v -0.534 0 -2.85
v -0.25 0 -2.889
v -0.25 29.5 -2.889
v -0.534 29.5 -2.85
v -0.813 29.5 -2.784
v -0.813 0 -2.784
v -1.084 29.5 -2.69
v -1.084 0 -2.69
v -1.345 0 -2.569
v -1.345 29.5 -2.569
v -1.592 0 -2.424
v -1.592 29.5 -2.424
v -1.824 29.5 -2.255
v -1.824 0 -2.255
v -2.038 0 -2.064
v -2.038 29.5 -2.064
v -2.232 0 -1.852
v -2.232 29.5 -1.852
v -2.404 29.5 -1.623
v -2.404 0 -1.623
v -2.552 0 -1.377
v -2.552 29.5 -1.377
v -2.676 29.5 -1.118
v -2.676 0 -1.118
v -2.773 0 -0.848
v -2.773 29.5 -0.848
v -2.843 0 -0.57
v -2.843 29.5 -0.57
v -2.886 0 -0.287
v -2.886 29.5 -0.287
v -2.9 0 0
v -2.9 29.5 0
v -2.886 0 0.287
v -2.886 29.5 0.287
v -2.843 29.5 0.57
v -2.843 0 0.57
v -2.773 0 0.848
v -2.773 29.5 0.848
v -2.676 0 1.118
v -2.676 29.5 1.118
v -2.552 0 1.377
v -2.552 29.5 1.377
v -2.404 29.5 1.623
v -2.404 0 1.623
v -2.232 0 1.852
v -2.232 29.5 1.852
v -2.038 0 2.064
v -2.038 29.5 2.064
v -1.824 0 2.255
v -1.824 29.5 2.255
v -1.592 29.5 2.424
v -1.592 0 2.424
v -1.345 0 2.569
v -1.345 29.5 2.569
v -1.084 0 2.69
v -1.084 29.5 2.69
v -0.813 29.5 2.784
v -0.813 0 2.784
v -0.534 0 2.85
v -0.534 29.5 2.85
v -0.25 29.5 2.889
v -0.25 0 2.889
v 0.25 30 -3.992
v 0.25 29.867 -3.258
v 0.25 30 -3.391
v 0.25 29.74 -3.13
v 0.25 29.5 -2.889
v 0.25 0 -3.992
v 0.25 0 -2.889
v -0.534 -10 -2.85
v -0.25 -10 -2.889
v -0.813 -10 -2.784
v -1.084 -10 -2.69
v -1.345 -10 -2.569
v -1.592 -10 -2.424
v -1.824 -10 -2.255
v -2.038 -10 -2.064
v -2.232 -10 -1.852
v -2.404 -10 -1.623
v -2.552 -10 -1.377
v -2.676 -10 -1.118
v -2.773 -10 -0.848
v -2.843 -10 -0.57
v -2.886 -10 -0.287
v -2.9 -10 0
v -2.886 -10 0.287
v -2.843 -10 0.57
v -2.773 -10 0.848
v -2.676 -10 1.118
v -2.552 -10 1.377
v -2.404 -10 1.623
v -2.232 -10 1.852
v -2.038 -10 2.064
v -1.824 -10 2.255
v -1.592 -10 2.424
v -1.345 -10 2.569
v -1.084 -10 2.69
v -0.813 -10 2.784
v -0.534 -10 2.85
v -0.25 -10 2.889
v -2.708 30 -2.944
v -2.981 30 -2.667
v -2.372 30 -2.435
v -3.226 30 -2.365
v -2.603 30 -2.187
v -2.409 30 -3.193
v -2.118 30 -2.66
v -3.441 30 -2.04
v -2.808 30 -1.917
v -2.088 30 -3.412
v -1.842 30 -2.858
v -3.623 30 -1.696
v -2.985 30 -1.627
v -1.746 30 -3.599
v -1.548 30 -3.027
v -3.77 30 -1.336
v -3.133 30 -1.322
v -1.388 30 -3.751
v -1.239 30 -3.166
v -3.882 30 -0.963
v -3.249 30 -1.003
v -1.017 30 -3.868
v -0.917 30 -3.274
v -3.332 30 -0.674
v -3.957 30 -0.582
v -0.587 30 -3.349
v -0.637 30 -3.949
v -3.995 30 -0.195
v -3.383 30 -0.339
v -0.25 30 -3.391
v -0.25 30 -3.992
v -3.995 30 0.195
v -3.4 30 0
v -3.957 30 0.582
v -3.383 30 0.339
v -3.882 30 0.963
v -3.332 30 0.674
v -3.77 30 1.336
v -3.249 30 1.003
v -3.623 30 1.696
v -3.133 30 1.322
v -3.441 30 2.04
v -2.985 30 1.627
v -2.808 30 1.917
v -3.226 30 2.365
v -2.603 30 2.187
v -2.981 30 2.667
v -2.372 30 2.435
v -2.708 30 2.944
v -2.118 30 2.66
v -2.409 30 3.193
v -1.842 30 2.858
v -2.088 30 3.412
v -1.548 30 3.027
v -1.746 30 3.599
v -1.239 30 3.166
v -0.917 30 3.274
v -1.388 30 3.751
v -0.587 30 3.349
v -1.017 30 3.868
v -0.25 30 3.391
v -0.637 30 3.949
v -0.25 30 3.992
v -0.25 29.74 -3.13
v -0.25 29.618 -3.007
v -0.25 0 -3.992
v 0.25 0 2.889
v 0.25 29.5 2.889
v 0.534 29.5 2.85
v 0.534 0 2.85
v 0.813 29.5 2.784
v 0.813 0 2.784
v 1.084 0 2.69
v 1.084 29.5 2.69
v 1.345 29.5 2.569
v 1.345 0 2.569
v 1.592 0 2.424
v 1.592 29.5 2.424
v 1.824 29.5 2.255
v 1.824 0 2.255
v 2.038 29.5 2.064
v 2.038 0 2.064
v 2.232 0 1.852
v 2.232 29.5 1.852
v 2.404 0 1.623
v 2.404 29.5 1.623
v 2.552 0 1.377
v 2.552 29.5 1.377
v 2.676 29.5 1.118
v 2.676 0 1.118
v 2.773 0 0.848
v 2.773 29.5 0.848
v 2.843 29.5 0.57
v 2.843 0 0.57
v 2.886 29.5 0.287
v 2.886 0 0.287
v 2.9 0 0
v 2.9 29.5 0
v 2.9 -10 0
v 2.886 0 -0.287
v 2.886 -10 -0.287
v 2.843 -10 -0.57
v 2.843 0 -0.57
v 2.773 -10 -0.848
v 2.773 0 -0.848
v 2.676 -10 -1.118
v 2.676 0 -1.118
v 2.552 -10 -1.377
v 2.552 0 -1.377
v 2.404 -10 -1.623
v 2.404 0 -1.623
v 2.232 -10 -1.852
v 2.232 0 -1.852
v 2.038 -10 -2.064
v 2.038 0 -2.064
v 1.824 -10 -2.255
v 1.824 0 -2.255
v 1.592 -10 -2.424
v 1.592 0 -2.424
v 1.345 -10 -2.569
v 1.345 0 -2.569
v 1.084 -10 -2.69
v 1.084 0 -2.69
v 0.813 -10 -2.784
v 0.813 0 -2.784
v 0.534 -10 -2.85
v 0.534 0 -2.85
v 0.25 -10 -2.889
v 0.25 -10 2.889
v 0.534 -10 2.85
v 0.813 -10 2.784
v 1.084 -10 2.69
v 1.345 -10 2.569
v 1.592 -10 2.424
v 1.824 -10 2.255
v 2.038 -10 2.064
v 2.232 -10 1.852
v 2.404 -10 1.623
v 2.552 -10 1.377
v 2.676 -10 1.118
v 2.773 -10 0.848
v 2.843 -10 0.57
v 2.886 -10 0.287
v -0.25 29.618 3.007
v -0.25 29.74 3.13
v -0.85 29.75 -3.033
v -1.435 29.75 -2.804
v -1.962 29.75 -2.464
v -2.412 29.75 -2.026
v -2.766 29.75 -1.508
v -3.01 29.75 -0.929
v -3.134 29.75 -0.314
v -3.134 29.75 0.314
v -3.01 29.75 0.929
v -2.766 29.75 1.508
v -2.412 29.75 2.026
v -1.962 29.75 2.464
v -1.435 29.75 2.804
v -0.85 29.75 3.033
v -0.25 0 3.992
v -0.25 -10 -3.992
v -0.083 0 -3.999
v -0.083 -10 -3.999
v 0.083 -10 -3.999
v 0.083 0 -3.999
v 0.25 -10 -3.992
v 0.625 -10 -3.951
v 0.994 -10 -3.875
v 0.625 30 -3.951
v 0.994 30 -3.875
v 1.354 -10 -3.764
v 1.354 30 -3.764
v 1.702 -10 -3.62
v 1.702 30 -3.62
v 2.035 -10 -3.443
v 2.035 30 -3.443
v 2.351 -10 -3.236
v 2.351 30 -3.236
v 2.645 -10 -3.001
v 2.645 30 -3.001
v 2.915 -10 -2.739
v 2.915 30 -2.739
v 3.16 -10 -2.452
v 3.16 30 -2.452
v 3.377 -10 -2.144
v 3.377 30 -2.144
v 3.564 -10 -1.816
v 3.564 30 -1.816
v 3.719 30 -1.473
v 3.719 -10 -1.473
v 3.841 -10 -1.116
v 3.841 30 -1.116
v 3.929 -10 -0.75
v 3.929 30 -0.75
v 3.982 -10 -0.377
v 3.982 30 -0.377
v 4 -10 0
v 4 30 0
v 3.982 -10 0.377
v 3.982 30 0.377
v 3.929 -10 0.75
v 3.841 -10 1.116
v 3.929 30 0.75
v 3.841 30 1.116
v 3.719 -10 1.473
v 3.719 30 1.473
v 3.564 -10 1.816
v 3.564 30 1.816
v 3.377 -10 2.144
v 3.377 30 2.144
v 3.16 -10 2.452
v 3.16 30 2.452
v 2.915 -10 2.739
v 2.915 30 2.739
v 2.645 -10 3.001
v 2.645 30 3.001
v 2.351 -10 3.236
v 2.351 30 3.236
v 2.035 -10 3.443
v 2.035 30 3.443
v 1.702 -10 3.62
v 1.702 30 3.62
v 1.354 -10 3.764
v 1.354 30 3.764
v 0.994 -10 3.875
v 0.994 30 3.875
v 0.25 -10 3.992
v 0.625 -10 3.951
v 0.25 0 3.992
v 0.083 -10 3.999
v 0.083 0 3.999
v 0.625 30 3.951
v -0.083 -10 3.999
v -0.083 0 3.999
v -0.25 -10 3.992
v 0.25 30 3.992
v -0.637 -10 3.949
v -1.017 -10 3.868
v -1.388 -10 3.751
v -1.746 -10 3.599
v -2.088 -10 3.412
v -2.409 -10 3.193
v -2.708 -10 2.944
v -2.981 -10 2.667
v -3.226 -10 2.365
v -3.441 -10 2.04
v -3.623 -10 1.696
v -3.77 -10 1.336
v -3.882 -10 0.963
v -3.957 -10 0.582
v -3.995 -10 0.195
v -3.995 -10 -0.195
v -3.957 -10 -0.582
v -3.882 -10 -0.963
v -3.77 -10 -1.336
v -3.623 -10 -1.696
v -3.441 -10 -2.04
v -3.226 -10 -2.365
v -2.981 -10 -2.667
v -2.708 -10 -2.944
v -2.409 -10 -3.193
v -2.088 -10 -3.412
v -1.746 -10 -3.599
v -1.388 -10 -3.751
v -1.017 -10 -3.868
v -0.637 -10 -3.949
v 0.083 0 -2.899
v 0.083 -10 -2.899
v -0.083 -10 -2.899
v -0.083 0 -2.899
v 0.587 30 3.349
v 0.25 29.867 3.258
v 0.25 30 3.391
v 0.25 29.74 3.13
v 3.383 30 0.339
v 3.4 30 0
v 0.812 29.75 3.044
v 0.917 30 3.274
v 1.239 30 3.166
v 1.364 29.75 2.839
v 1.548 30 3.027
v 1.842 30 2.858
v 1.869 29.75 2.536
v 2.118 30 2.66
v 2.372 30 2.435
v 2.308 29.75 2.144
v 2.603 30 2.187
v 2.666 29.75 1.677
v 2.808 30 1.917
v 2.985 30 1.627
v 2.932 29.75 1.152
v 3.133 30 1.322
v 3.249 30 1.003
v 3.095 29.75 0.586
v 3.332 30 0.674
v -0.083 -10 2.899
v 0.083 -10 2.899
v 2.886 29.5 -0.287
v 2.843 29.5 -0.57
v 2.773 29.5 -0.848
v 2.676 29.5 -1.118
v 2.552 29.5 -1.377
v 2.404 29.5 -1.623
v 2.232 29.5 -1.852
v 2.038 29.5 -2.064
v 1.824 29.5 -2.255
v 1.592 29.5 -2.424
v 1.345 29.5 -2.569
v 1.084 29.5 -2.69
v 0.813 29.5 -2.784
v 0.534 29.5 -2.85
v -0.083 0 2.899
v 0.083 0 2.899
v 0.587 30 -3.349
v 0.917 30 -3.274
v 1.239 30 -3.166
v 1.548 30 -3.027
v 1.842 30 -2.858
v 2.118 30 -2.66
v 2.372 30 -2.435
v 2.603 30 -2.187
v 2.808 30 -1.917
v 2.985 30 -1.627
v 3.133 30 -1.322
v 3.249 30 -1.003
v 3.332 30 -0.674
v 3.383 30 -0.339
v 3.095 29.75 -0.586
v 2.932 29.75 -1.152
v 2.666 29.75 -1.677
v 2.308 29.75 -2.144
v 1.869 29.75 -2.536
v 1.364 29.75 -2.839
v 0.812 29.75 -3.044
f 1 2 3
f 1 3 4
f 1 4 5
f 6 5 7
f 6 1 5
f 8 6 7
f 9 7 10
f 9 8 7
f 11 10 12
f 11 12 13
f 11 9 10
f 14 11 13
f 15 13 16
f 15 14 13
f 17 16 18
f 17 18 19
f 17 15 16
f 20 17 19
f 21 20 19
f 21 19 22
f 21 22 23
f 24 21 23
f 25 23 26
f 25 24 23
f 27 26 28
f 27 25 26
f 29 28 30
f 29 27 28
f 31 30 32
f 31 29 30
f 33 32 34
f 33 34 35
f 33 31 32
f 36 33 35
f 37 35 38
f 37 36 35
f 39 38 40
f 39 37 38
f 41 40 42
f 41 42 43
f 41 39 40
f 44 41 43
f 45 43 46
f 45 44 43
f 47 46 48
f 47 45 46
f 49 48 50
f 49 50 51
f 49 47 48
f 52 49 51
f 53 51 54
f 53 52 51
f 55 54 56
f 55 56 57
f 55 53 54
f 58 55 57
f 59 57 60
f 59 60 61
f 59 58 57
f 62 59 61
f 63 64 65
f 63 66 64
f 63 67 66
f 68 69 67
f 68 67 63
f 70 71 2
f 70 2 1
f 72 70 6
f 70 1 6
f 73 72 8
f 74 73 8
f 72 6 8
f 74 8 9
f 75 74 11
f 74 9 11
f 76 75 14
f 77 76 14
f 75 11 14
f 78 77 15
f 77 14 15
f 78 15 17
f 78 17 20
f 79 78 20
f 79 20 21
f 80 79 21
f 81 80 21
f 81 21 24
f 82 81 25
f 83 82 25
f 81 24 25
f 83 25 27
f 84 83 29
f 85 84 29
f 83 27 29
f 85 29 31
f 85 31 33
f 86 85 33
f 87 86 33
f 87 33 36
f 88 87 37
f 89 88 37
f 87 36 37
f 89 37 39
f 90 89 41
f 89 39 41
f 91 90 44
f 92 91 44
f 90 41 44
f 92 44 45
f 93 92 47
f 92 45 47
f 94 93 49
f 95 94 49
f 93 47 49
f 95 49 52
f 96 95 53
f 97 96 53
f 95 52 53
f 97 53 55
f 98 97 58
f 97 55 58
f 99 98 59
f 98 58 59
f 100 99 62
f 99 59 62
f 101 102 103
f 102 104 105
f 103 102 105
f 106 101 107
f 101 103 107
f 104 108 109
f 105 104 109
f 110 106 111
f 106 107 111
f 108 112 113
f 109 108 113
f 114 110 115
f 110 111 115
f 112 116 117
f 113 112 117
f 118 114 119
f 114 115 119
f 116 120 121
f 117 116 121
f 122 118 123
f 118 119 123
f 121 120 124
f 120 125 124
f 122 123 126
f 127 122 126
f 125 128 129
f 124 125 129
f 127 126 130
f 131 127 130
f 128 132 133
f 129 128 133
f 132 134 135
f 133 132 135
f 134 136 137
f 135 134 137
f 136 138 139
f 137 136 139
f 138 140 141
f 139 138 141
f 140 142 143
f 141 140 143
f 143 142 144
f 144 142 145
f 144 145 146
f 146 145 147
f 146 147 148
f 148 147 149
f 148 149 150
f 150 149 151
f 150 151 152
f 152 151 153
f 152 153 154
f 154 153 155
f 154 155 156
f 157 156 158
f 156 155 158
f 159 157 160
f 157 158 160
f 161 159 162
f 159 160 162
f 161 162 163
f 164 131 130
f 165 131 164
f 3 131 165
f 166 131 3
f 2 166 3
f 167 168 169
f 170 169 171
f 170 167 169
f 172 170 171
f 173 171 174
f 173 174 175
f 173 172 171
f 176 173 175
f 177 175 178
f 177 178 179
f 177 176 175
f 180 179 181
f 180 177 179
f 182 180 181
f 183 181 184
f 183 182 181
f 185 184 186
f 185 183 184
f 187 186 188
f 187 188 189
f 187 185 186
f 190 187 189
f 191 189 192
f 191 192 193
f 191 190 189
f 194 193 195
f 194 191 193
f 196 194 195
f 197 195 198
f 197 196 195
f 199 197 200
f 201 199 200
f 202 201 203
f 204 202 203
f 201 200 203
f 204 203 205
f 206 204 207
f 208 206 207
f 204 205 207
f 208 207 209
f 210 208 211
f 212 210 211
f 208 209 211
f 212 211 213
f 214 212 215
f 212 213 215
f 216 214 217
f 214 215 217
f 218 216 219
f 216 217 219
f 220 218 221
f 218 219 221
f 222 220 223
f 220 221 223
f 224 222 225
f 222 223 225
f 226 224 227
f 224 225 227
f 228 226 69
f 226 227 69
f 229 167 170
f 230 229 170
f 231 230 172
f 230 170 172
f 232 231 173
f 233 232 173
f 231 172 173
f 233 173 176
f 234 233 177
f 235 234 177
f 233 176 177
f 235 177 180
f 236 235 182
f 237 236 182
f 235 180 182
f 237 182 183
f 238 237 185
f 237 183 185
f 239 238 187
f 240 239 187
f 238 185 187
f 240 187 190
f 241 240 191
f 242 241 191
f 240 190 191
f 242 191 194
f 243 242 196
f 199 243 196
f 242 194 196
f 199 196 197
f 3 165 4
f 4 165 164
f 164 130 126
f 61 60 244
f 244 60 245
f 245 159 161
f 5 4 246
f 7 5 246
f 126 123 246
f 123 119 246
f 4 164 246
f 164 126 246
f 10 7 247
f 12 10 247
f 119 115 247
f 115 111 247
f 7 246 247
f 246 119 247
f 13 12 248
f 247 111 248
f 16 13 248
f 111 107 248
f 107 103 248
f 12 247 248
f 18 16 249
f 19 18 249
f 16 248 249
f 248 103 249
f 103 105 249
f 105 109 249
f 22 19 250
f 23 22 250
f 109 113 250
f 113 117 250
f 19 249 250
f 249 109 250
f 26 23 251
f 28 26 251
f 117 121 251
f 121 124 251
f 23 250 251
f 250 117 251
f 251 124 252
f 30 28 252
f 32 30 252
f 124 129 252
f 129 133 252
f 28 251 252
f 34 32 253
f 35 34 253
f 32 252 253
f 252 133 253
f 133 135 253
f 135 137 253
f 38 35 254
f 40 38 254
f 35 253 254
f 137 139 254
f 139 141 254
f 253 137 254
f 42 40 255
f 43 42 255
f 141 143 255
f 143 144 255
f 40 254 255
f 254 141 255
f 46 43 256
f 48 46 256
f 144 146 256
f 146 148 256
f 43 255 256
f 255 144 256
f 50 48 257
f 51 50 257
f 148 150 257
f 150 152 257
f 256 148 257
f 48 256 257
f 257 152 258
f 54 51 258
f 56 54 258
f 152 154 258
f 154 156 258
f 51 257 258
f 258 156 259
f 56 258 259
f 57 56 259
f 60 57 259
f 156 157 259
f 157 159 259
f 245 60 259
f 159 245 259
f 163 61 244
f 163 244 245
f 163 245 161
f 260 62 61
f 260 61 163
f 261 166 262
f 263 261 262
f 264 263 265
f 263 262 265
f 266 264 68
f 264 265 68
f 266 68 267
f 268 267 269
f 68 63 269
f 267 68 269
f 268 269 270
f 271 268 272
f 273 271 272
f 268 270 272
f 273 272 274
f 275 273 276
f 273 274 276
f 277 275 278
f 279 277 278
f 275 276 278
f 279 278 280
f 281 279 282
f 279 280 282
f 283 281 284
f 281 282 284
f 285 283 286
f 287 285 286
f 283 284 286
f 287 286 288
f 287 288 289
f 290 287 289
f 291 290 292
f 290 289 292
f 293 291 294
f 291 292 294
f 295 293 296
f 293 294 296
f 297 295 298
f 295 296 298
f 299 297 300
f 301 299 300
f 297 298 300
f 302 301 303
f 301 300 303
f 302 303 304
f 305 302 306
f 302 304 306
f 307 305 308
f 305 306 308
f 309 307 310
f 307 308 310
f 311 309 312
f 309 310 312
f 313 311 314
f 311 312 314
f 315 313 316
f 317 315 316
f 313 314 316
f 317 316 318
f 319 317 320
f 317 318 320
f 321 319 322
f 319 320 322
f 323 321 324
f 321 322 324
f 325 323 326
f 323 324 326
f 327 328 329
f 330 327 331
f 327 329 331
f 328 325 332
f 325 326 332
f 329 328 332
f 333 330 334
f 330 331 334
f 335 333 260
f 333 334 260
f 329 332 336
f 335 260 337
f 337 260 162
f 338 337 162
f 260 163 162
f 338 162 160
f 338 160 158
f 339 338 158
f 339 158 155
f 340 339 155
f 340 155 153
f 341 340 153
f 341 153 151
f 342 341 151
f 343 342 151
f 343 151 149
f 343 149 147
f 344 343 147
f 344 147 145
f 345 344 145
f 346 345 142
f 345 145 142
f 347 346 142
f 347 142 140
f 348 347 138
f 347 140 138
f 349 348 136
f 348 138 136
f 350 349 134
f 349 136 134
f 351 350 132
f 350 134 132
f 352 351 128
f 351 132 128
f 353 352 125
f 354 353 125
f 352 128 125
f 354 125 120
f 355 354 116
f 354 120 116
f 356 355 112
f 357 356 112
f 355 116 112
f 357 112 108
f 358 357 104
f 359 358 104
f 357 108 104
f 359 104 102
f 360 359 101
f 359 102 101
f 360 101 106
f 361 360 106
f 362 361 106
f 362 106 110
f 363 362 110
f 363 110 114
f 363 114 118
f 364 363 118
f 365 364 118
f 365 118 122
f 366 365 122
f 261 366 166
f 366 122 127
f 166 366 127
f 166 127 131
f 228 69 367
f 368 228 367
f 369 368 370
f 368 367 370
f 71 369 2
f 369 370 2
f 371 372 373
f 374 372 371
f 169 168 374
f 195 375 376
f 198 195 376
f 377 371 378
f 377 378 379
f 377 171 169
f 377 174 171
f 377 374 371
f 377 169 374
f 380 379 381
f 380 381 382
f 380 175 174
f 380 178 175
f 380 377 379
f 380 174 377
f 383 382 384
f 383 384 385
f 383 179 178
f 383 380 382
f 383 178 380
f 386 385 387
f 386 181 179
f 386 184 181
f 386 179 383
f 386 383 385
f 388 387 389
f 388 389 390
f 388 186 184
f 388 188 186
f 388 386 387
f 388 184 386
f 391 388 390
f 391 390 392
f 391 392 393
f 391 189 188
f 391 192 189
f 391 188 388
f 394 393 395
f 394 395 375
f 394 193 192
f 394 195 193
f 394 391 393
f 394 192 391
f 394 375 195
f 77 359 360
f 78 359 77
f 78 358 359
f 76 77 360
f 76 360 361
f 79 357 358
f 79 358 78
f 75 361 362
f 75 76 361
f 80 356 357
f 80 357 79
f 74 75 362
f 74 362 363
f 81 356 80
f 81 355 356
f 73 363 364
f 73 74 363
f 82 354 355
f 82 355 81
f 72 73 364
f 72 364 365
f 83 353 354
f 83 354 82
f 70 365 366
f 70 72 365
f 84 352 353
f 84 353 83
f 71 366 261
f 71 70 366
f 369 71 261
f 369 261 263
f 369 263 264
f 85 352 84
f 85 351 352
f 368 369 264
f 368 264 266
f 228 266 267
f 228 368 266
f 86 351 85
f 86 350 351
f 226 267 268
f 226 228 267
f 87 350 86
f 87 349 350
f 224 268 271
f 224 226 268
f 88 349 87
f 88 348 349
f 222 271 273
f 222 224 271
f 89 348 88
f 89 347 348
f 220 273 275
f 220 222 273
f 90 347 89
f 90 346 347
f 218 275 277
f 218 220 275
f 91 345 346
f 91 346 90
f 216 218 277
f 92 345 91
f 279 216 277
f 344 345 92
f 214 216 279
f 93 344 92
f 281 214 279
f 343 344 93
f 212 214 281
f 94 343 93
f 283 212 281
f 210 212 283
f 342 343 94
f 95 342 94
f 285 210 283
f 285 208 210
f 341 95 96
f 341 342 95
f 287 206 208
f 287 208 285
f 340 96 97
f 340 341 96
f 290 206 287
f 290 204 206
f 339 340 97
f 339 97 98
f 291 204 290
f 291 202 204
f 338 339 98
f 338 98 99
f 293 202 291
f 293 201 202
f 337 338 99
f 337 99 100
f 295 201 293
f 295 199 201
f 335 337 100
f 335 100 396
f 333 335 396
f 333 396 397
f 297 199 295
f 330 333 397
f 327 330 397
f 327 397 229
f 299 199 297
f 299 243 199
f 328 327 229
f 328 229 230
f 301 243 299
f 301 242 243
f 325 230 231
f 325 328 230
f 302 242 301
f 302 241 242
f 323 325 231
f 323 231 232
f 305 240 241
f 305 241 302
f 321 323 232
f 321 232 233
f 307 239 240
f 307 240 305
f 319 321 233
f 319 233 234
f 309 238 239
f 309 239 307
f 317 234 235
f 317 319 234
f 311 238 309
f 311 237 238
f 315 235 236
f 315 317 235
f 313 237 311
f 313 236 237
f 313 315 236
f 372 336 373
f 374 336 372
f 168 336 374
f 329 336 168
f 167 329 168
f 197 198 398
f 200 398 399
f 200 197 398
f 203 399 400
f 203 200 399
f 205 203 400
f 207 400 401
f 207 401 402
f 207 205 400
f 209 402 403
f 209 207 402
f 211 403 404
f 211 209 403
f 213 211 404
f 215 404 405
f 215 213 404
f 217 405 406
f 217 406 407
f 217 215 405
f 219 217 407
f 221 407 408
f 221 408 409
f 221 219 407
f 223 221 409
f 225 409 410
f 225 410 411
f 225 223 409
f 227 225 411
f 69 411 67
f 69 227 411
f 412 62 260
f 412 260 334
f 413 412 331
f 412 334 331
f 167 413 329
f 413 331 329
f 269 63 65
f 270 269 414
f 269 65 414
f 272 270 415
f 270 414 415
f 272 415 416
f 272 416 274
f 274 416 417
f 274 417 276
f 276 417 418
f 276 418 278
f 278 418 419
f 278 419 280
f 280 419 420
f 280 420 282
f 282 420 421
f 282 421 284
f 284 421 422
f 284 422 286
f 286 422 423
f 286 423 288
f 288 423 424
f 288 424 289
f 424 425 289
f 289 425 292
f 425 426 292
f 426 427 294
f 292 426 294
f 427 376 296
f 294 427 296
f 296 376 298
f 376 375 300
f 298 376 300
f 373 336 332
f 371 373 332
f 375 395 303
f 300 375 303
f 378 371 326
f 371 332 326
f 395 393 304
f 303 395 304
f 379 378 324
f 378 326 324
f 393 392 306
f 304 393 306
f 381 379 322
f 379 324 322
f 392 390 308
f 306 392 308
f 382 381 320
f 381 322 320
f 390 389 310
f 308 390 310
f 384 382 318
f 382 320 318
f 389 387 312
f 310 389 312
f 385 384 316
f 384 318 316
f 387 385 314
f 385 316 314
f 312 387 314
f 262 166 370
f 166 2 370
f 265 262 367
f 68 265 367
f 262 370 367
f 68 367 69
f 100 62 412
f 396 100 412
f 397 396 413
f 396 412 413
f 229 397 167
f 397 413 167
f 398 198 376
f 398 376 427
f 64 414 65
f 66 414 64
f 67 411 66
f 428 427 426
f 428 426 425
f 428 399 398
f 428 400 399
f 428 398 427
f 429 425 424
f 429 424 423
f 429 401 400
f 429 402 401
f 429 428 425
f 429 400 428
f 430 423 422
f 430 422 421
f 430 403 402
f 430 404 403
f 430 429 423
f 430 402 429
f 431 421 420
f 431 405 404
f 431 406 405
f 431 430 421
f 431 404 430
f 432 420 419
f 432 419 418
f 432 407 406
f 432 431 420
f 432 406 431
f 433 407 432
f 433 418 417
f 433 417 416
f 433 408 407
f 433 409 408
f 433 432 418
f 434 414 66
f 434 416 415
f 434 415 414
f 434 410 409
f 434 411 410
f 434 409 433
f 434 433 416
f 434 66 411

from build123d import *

# Parameters (mm, degrees)
F1_DEPTH = 30
F2_DEPTH = 10
F3_SIZE  = 0.5


with BuildPart() as f1:
    # F0 (on Front) → F1 (new body)
    with BuildSketch(Plane.XZ):
        with BuildLine():
            Line((-0.25, 2.8892040426), (-0.25, 3.9921798557))
            ThreePointArc((-0.25, 3.9921798557), (-4, 0), (-0.25, -3.9921798557))
            Line((-0.25, -3.9921798557), (-0.25, -2.8892040426))
            ThreePointArc((-0.25, -2.8892040426), (-2.9, 0), (-0.25, 2.8892040426))
        make_face()
    extrude(amount=-F1_DEPTH)



with BuildPart() as f1b:
    # F0 (on Front) → F1, piece 2 (new body)
    with BuildSketch(Plane.XZ):
        with BuildLine():
            ThreePointArc((0.25, -3.9921798557), (2.9154759474, -2.7386127875), (4, 0))
            ThreePointArc((4, 0), (2.9154759474, 2.7386127875), (0.25, 3.9921798557))
            Line((0.25, 3.9921798557), (0.25, 2.8892040426))
            ThreePointArc((0.25, 2.8892040426), (2.1371710273, 1.9602295784), (2.9, 0))
            ThreePointArc((2.9, 0), (2.1371710273, -1.9602295784), (0.25, -2.8892040426))
            Line((0.25, -2.8892040426), (0.25, -3.9921798557))
        make_face()
    extrude(amount=-F1_DEPTH)


with BuildPart() as f1_1:
    add(f1.part)

    add(f1b.part)  # F2 merges F1b
    # F0 (on Front) → F2 (join)
    with BuildSketch(Plane.XZ):
        with BuildLine():
            ThreePointArc((0.25, -3.9921798557), (2.9154759474, -2.7386127875), (4, 0))
            ThreePointArc((4, 0), (2.9154759474, 2.7386127875), (0.25, 3.9921798557))
            Line((0.25, 3.9921798557), (0.25, 2.8892040426))
            ThreePointArc((0.25, 2.8892040426), (2.1371710273, 1.9602295784), (2.9, 0))
            ThreePointArc((2.9, 0), (2.1371710273, -1.9602295784), (0.25, -2.8892040426))
            Line((0.25, -2.8892040426), (0.25, -3.9921798557))
        make_face()
        with BuildLine():
            Line((0.25, 2.8892040426), (0.25, 3.9921798557))
            ThreePointArc((0.25, 3.9921798557), (0, 4), (-0.25, 3.9921798557))
            Line((-0.25, 3.9921798557), (-0.25, 2.8892040426))
            ThreePointArc((-0.25, 2.8892040426), (0, 2.9), (0.25, 2.8892040426))
        make_face()
        with BuildLine():
            ThreePointArc((-0.25, -3.9921798557), (0, -4), (0.25, -3.9921798557))
            Line((0.25, -3.9921798557), (0.25, -2.8892040426))
            ThreePointArc((0.25, -2.8892040426), (0, -2.9), (-0.25, -2.8892040426))
            Line((-0.25, -2.8892040426), (-0.25, -3.9921798557))
        make_face()
        with BuildLine():
            Line((-0.25, 2.8892040426), (-0.25, 3.9921798557))
            ThreePointArc((-0.25, 3.9921798557), (-4, 0), (-0.25, -3.9921798557))
            Line((-0.25, -3.9921798557), (-0.25, -2.8892040426))
            ThreePointArc((-0.25, -2.8892040426), (-2.9, 0), (-0.25, 2.8892040426))
        make_face()
    extrude(amount=F2_DEPTH)

    # F3
    f3_edges = [f1_1.edges().sort_by_distance(p)[0] for p in [
        (-2.9, 30, 0),
        (2.9, 30, 0),
    ]]
    chamfer(f3_edges, length=F3_SIZE)


solid = f1_1.part
